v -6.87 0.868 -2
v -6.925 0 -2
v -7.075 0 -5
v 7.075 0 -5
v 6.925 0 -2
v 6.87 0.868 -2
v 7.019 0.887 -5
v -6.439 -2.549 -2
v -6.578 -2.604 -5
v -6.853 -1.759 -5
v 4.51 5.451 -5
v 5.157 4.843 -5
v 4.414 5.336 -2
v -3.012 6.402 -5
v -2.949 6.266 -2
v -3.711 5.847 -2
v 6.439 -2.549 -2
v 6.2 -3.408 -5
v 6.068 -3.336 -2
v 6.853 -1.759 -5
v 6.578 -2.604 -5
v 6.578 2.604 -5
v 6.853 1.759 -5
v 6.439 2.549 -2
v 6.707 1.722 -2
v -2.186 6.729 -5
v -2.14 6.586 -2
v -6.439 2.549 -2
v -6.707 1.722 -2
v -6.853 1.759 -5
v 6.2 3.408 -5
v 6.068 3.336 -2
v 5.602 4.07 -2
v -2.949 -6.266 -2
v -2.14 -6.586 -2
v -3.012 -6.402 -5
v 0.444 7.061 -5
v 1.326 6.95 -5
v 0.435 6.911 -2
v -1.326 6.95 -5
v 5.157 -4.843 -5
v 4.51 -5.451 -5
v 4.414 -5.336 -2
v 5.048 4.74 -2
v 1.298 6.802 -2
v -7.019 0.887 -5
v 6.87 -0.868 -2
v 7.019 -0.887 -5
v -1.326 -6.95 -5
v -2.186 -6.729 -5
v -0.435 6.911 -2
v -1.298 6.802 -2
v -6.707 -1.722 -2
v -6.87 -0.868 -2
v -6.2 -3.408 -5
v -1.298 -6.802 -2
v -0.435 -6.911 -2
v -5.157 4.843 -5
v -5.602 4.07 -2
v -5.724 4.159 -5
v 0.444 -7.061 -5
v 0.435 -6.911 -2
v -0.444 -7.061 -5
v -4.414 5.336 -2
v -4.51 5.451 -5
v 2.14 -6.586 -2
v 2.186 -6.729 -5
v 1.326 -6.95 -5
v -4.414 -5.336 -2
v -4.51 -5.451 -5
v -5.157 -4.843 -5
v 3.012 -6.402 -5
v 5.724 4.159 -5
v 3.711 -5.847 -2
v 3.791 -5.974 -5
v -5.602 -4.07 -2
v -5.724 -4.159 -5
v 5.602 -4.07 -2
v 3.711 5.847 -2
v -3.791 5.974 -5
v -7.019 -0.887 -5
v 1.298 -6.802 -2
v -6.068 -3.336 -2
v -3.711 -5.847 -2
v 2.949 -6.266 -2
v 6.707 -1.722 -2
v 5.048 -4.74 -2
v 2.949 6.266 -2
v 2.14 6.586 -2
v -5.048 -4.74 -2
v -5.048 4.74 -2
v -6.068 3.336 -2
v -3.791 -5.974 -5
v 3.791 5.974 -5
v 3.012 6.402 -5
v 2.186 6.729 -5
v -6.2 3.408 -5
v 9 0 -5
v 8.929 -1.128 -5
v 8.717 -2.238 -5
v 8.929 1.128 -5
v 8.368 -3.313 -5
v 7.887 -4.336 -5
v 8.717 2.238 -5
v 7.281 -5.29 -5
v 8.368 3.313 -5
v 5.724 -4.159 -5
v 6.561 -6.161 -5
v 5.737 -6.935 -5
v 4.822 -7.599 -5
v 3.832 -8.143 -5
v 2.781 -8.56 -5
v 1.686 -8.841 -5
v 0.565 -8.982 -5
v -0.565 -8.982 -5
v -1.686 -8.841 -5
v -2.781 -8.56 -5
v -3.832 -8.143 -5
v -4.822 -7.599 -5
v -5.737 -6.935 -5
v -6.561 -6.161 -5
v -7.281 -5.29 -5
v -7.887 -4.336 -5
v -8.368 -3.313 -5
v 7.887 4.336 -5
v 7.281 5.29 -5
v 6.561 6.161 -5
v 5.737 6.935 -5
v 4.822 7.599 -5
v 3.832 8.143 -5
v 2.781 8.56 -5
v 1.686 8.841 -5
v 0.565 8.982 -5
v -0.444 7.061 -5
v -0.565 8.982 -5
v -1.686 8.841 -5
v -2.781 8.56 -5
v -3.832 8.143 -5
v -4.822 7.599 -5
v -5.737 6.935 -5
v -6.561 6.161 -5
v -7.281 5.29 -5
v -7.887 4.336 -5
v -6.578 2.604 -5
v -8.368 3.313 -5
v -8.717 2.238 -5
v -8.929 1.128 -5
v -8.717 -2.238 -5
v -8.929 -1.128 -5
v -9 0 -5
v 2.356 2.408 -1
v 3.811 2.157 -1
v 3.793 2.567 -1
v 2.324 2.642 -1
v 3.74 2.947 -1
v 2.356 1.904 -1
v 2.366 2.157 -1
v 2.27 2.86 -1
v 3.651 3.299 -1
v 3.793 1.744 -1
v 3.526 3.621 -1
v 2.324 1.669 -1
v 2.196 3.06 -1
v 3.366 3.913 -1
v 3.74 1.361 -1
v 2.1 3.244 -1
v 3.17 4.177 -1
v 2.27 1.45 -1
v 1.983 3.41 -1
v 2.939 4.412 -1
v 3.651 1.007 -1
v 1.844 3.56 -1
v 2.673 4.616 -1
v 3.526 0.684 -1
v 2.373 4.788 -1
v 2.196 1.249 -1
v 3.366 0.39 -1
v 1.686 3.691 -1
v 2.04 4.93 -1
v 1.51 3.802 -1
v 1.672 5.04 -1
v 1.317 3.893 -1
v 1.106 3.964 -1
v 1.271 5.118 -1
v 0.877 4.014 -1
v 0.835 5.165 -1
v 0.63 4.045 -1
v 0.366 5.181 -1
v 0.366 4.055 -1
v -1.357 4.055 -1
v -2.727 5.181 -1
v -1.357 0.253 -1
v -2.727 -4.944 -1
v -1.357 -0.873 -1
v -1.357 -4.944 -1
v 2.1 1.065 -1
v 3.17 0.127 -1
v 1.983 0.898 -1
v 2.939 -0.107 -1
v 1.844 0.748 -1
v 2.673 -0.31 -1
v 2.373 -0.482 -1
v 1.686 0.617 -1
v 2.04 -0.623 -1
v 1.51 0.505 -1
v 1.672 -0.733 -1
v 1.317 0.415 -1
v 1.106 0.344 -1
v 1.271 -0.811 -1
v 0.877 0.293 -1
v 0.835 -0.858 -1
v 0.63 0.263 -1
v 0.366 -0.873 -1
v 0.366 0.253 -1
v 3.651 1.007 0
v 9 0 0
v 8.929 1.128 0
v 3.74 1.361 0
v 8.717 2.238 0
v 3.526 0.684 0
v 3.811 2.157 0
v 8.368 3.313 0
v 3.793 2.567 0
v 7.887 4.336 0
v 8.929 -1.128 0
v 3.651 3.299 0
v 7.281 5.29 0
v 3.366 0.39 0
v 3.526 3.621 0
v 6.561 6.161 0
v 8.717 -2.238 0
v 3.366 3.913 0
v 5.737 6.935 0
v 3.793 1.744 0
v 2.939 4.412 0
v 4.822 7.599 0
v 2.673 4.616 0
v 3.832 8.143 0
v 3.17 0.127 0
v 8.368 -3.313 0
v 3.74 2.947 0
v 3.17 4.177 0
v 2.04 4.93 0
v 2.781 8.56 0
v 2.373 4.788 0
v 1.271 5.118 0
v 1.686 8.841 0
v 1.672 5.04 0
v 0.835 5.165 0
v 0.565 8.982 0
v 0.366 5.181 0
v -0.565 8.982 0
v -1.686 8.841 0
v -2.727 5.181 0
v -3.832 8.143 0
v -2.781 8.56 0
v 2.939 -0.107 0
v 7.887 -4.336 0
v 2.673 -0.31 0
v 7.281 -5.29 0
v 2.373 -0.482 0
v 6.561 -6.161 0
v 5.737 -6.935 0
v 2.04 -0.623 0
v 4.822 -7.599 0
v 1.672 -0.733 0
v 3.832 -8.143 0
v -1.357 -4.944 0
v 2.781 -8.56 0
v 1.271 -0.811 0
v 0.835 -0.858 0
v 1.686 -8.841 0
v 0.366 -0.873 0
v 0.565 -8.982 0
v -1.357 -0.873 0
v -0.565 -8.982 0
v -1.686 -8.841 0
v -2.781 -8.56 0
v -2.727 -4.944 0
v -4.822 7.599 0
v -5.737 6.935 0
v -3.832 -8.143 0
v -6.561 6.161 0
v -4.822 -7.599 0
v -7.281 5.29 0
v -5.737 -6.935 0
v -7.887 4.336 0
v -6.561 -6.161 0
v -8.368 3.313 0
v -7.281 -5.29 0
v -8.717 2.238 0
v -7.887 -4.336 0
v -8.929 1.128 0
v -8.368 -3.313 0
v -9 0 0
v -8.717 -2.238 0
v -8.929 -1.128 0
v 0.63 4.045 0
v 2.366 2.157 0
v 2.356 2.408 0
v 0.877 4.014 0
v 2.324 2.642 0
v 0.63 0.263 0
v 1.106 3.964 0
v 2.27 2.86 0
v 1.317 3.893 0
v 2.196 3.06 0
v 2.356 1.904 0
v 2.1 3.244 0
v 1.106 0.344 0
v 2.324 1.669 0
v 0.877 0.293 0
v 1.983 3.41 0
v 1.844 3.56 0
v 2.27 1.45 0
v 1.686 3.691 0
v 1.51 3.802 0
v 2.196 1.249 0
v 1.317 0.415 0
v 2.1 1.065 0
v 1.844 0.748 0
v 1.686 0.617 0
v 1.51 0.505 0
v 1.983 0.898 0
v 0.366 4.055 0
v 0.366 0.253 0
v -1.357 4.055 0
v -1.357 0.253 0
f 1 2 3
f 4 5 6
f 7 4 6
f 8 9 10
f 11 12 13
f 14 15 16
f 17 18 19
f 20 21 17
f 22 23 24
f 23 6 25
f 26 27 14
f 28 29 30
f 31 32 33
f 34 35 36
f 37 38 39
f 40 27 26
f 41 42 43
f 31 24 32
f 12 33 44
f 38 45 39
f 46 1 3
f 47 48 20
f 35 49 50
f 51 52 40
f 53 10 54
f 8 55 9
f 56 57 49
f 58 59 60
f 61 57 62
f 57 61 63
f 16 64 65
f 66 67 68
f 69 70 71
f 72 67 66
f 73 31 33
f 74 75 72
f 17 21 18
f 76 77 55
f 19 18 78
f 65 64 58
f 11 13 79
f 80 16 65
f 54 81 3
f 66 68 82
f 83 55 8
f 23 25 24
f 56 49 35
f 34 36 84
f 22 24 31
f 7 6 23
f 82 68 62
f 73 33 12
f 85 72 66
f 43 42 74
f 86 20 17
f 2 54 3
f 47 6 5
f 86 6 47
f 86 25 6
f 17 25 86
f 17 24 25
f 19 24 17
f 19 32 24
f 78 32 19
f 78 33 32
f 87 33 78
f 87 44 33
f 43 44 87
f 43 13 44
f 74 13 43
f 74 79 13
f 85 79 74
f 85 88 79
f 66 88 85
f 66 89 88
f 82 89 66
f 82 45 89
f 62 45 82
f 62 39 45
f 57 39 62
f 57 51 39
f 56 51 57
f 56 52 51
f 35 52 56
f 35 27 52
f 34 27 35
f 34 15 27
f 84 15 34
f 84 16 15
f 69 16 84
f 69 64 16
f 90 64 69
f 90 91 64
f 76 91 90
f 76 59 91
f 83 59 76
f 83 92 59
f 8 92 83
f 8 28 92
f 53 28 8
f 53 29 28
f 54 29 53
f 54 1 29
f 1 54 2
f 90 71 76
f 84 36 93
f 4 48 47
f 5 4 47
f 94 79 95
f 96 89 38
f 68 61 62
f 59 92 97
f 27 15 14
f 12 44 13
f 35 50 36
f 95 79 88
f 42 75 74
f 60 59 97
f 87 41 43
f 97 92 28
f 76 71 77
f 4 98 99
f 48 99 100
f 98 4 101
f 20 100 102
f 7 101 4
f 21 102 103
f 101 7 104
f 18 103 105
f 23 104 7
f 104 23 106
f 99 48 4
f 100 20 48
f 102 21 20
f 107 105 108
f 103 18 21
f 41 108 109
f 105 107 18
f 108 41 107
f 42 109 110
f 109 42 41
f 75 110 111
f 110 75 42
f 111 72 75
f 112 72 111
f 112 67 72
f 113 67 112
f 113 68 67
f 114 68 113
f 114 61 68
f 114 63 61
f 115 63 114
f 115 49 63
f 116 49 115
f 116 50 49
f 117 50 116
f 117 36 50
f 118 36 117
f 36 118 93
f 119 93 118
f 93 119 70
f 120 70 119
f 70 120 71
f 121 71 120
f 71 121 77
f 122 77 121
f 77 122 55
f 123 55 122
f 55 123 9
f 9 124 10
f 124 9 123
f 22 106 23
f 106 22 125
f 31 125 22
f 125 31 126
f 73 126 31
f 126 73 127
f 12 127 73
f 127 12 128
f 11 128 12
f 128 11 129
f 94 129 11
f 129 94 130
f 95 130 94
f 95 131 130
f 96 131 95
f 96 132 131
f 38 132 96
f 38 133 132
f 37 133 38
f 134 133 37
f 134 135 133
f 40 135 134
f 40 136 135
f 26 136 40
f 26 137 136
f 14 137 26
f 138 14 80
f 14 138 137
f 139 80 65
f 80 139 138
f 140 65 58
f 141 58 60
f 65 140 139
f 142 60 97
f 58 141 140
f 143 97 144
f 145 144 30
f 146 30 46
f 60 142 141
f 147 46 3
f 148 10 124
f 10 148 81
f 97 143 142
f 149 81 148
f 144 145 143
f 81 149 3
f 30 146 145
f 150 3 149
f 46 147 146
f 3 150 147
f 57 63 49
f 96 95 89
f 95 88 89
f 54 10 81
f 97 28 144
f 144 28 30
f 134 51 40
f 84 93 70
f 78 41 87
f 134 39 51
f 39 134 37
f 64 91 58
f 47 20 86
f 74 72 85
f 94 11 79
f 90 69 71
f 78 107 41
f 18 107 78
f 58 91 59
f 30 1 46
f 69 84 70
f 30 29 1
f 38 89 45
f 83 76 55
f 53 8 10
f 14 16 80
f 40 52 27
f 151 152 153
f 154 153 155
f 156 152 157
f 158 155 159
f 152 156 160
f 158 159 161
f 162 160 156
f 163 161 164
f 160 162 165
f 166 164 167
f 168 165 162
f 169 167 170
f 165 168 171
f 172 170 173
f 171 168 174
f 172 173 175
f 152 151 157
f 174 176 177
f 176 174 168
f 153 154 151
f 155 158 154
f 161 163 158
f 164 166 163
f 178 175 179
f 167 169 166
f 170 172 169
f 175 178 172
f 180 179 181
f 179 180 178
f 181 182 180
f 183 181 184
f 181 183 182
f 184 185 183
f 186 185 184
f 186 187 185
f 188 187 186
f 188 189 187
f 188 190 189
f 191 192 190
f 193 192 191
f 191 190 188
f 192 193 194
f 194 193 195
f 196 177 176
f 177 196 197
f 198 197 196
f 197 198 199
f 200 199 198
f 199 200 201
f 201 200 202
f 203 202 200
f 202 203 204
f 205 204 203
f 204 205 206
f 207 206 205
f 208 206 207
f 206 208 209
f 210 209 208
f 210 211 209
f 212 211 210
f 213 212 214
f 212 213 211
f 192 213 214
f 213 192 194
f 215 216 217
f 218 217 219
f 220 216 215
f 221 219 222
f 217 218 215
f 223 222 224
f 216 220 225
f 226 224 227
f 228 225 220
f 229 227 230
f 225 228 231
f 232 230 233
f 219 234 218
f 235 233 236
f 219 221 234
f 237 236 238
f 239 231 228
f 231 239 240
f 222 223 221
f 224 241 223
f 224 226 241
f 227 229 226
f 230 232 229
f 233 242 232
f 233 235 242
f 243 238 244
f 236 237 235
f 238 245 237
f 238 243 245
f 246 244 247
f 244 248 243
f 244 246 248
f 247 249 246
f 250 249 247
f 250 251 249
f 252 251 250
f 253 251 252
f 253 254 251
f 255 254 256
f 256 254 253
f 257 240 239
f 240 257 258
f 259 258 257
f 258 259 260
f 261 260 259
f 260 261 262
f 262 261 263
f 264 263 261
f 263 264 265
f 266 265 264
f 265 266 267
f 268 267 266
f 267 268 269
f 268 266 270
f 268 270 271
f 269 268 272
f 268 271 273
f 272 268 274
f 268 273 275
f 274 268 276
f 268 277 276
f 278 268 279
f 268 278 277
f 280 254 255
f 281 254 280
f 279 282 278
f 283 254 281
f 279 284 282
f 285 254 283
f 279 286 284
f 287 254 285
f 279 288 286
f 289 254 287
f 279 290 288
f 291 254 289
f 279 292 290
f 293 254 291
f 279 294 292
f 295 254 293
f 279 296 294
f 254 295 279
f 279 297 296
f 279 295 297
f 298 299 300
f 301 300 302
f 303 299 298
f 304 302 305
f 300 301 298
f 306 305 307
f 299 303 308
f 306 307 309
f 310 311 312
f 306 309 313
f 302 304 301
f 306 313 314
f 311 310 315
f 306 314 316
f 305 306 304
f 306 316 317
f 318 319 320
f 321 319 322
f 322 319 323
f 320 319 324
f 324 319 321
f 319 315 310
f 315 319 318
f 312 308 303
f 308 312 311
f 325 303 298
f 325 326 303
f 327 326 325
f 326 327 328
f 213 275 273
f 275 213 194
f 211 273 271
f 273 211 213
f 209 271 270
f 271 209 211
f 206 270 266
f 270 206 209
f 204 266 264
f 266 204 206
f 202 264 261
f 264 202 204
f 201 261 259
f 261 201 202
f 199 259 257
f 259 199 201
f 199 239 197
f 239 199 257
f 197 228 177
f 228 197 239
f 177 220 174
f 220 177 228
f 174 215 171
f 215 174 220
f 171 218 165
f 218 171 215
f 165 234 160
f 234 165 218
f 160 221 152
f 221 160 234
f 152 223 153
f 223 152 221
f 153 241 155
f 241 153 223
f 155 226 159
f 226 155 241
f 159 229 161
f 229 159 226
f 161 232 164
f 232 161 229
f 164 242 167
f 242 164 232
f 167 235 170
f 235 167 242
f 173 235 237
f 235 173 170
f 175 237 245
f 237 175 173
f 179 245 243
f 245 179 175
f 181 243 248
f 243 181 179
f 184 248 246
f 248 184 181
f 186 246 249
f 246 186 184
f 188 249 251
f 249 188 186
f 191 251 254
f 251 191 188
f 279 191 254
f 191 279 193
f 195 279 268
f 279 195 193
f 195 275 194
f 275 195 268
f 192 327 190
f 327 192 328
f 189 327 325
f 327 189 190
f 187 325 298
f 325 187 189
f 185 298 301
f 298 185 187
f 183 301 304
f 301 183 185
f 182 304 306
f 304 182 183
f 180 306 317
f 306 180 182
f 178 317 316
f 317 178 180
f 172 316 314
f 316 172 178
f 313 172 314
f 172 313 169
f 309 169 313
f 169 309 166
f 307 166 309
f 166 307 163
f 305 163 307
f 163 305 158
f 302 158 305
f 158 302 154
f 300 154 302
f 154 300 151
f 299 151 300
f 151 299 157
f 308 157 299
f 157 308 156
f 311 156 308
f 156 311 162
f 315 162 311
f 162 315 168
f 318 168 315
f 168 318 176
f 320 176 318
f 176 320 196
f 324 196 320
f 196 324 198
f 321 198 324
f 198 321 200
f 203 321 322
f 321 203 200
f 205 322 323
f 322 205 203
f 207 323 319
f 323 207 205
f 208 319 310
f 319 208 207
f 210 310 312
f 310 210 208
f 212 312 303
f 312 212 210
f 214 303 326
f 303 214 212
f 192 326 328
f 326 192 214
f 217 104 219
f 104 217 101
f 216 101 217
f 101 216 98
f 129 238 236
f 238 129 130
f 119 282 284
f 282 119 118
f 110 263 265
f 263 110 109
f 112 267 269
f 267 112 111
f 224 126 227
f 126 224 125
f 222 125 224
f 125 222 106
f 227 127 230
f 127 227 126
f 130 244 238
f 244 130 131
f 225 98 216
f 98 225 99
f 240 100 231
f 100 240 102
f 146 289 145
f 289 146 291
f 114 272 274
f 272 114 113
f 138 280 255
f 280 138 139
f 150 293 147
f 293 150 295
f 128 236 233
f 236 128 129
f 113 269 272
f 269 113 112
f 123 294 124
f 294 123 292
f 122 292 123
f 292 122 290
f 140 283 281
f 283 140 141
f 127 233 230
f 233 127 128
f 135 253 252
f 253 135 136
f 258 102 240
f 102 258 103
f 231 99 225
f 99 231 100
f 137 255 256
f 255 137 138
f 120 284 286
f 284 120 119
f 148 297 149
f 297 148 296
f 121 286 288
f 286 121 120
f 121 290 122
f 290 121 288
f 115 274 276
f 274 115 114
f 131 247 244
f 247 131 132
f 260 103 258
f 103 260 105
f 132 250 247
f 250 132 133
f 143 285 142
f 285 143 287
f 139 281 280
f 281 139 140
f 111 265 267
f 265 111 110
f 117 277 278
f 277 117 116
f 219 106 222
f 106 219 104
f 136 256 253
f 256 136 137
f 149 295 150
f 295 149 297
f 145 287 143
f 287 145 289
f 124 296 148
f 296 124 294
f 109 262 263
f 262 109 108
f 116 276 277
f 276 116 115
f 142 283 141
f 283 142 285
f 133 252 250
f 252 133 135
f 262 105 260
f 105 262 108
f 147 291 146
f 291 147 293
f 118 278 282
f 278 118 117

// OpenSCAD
$fn = 50;

difference() {
	union() {
		translate(v = [0, 0, -5.0]) {
			cylinder(h = 5, r = 9.0);
		}
	}
	union() {
		#translate(v = [0, 0, -5.0]) {
			cylinder(h = 3, r1 = 7.075, r2 = 6.925);
		}
		translate(v = [0, 0, -1]) {
			linear_extrude(height = 1) {
				text(font = "Impact", halign = "center", size = 10, text = "P", valign = "center");
			}
		}
	}
}
